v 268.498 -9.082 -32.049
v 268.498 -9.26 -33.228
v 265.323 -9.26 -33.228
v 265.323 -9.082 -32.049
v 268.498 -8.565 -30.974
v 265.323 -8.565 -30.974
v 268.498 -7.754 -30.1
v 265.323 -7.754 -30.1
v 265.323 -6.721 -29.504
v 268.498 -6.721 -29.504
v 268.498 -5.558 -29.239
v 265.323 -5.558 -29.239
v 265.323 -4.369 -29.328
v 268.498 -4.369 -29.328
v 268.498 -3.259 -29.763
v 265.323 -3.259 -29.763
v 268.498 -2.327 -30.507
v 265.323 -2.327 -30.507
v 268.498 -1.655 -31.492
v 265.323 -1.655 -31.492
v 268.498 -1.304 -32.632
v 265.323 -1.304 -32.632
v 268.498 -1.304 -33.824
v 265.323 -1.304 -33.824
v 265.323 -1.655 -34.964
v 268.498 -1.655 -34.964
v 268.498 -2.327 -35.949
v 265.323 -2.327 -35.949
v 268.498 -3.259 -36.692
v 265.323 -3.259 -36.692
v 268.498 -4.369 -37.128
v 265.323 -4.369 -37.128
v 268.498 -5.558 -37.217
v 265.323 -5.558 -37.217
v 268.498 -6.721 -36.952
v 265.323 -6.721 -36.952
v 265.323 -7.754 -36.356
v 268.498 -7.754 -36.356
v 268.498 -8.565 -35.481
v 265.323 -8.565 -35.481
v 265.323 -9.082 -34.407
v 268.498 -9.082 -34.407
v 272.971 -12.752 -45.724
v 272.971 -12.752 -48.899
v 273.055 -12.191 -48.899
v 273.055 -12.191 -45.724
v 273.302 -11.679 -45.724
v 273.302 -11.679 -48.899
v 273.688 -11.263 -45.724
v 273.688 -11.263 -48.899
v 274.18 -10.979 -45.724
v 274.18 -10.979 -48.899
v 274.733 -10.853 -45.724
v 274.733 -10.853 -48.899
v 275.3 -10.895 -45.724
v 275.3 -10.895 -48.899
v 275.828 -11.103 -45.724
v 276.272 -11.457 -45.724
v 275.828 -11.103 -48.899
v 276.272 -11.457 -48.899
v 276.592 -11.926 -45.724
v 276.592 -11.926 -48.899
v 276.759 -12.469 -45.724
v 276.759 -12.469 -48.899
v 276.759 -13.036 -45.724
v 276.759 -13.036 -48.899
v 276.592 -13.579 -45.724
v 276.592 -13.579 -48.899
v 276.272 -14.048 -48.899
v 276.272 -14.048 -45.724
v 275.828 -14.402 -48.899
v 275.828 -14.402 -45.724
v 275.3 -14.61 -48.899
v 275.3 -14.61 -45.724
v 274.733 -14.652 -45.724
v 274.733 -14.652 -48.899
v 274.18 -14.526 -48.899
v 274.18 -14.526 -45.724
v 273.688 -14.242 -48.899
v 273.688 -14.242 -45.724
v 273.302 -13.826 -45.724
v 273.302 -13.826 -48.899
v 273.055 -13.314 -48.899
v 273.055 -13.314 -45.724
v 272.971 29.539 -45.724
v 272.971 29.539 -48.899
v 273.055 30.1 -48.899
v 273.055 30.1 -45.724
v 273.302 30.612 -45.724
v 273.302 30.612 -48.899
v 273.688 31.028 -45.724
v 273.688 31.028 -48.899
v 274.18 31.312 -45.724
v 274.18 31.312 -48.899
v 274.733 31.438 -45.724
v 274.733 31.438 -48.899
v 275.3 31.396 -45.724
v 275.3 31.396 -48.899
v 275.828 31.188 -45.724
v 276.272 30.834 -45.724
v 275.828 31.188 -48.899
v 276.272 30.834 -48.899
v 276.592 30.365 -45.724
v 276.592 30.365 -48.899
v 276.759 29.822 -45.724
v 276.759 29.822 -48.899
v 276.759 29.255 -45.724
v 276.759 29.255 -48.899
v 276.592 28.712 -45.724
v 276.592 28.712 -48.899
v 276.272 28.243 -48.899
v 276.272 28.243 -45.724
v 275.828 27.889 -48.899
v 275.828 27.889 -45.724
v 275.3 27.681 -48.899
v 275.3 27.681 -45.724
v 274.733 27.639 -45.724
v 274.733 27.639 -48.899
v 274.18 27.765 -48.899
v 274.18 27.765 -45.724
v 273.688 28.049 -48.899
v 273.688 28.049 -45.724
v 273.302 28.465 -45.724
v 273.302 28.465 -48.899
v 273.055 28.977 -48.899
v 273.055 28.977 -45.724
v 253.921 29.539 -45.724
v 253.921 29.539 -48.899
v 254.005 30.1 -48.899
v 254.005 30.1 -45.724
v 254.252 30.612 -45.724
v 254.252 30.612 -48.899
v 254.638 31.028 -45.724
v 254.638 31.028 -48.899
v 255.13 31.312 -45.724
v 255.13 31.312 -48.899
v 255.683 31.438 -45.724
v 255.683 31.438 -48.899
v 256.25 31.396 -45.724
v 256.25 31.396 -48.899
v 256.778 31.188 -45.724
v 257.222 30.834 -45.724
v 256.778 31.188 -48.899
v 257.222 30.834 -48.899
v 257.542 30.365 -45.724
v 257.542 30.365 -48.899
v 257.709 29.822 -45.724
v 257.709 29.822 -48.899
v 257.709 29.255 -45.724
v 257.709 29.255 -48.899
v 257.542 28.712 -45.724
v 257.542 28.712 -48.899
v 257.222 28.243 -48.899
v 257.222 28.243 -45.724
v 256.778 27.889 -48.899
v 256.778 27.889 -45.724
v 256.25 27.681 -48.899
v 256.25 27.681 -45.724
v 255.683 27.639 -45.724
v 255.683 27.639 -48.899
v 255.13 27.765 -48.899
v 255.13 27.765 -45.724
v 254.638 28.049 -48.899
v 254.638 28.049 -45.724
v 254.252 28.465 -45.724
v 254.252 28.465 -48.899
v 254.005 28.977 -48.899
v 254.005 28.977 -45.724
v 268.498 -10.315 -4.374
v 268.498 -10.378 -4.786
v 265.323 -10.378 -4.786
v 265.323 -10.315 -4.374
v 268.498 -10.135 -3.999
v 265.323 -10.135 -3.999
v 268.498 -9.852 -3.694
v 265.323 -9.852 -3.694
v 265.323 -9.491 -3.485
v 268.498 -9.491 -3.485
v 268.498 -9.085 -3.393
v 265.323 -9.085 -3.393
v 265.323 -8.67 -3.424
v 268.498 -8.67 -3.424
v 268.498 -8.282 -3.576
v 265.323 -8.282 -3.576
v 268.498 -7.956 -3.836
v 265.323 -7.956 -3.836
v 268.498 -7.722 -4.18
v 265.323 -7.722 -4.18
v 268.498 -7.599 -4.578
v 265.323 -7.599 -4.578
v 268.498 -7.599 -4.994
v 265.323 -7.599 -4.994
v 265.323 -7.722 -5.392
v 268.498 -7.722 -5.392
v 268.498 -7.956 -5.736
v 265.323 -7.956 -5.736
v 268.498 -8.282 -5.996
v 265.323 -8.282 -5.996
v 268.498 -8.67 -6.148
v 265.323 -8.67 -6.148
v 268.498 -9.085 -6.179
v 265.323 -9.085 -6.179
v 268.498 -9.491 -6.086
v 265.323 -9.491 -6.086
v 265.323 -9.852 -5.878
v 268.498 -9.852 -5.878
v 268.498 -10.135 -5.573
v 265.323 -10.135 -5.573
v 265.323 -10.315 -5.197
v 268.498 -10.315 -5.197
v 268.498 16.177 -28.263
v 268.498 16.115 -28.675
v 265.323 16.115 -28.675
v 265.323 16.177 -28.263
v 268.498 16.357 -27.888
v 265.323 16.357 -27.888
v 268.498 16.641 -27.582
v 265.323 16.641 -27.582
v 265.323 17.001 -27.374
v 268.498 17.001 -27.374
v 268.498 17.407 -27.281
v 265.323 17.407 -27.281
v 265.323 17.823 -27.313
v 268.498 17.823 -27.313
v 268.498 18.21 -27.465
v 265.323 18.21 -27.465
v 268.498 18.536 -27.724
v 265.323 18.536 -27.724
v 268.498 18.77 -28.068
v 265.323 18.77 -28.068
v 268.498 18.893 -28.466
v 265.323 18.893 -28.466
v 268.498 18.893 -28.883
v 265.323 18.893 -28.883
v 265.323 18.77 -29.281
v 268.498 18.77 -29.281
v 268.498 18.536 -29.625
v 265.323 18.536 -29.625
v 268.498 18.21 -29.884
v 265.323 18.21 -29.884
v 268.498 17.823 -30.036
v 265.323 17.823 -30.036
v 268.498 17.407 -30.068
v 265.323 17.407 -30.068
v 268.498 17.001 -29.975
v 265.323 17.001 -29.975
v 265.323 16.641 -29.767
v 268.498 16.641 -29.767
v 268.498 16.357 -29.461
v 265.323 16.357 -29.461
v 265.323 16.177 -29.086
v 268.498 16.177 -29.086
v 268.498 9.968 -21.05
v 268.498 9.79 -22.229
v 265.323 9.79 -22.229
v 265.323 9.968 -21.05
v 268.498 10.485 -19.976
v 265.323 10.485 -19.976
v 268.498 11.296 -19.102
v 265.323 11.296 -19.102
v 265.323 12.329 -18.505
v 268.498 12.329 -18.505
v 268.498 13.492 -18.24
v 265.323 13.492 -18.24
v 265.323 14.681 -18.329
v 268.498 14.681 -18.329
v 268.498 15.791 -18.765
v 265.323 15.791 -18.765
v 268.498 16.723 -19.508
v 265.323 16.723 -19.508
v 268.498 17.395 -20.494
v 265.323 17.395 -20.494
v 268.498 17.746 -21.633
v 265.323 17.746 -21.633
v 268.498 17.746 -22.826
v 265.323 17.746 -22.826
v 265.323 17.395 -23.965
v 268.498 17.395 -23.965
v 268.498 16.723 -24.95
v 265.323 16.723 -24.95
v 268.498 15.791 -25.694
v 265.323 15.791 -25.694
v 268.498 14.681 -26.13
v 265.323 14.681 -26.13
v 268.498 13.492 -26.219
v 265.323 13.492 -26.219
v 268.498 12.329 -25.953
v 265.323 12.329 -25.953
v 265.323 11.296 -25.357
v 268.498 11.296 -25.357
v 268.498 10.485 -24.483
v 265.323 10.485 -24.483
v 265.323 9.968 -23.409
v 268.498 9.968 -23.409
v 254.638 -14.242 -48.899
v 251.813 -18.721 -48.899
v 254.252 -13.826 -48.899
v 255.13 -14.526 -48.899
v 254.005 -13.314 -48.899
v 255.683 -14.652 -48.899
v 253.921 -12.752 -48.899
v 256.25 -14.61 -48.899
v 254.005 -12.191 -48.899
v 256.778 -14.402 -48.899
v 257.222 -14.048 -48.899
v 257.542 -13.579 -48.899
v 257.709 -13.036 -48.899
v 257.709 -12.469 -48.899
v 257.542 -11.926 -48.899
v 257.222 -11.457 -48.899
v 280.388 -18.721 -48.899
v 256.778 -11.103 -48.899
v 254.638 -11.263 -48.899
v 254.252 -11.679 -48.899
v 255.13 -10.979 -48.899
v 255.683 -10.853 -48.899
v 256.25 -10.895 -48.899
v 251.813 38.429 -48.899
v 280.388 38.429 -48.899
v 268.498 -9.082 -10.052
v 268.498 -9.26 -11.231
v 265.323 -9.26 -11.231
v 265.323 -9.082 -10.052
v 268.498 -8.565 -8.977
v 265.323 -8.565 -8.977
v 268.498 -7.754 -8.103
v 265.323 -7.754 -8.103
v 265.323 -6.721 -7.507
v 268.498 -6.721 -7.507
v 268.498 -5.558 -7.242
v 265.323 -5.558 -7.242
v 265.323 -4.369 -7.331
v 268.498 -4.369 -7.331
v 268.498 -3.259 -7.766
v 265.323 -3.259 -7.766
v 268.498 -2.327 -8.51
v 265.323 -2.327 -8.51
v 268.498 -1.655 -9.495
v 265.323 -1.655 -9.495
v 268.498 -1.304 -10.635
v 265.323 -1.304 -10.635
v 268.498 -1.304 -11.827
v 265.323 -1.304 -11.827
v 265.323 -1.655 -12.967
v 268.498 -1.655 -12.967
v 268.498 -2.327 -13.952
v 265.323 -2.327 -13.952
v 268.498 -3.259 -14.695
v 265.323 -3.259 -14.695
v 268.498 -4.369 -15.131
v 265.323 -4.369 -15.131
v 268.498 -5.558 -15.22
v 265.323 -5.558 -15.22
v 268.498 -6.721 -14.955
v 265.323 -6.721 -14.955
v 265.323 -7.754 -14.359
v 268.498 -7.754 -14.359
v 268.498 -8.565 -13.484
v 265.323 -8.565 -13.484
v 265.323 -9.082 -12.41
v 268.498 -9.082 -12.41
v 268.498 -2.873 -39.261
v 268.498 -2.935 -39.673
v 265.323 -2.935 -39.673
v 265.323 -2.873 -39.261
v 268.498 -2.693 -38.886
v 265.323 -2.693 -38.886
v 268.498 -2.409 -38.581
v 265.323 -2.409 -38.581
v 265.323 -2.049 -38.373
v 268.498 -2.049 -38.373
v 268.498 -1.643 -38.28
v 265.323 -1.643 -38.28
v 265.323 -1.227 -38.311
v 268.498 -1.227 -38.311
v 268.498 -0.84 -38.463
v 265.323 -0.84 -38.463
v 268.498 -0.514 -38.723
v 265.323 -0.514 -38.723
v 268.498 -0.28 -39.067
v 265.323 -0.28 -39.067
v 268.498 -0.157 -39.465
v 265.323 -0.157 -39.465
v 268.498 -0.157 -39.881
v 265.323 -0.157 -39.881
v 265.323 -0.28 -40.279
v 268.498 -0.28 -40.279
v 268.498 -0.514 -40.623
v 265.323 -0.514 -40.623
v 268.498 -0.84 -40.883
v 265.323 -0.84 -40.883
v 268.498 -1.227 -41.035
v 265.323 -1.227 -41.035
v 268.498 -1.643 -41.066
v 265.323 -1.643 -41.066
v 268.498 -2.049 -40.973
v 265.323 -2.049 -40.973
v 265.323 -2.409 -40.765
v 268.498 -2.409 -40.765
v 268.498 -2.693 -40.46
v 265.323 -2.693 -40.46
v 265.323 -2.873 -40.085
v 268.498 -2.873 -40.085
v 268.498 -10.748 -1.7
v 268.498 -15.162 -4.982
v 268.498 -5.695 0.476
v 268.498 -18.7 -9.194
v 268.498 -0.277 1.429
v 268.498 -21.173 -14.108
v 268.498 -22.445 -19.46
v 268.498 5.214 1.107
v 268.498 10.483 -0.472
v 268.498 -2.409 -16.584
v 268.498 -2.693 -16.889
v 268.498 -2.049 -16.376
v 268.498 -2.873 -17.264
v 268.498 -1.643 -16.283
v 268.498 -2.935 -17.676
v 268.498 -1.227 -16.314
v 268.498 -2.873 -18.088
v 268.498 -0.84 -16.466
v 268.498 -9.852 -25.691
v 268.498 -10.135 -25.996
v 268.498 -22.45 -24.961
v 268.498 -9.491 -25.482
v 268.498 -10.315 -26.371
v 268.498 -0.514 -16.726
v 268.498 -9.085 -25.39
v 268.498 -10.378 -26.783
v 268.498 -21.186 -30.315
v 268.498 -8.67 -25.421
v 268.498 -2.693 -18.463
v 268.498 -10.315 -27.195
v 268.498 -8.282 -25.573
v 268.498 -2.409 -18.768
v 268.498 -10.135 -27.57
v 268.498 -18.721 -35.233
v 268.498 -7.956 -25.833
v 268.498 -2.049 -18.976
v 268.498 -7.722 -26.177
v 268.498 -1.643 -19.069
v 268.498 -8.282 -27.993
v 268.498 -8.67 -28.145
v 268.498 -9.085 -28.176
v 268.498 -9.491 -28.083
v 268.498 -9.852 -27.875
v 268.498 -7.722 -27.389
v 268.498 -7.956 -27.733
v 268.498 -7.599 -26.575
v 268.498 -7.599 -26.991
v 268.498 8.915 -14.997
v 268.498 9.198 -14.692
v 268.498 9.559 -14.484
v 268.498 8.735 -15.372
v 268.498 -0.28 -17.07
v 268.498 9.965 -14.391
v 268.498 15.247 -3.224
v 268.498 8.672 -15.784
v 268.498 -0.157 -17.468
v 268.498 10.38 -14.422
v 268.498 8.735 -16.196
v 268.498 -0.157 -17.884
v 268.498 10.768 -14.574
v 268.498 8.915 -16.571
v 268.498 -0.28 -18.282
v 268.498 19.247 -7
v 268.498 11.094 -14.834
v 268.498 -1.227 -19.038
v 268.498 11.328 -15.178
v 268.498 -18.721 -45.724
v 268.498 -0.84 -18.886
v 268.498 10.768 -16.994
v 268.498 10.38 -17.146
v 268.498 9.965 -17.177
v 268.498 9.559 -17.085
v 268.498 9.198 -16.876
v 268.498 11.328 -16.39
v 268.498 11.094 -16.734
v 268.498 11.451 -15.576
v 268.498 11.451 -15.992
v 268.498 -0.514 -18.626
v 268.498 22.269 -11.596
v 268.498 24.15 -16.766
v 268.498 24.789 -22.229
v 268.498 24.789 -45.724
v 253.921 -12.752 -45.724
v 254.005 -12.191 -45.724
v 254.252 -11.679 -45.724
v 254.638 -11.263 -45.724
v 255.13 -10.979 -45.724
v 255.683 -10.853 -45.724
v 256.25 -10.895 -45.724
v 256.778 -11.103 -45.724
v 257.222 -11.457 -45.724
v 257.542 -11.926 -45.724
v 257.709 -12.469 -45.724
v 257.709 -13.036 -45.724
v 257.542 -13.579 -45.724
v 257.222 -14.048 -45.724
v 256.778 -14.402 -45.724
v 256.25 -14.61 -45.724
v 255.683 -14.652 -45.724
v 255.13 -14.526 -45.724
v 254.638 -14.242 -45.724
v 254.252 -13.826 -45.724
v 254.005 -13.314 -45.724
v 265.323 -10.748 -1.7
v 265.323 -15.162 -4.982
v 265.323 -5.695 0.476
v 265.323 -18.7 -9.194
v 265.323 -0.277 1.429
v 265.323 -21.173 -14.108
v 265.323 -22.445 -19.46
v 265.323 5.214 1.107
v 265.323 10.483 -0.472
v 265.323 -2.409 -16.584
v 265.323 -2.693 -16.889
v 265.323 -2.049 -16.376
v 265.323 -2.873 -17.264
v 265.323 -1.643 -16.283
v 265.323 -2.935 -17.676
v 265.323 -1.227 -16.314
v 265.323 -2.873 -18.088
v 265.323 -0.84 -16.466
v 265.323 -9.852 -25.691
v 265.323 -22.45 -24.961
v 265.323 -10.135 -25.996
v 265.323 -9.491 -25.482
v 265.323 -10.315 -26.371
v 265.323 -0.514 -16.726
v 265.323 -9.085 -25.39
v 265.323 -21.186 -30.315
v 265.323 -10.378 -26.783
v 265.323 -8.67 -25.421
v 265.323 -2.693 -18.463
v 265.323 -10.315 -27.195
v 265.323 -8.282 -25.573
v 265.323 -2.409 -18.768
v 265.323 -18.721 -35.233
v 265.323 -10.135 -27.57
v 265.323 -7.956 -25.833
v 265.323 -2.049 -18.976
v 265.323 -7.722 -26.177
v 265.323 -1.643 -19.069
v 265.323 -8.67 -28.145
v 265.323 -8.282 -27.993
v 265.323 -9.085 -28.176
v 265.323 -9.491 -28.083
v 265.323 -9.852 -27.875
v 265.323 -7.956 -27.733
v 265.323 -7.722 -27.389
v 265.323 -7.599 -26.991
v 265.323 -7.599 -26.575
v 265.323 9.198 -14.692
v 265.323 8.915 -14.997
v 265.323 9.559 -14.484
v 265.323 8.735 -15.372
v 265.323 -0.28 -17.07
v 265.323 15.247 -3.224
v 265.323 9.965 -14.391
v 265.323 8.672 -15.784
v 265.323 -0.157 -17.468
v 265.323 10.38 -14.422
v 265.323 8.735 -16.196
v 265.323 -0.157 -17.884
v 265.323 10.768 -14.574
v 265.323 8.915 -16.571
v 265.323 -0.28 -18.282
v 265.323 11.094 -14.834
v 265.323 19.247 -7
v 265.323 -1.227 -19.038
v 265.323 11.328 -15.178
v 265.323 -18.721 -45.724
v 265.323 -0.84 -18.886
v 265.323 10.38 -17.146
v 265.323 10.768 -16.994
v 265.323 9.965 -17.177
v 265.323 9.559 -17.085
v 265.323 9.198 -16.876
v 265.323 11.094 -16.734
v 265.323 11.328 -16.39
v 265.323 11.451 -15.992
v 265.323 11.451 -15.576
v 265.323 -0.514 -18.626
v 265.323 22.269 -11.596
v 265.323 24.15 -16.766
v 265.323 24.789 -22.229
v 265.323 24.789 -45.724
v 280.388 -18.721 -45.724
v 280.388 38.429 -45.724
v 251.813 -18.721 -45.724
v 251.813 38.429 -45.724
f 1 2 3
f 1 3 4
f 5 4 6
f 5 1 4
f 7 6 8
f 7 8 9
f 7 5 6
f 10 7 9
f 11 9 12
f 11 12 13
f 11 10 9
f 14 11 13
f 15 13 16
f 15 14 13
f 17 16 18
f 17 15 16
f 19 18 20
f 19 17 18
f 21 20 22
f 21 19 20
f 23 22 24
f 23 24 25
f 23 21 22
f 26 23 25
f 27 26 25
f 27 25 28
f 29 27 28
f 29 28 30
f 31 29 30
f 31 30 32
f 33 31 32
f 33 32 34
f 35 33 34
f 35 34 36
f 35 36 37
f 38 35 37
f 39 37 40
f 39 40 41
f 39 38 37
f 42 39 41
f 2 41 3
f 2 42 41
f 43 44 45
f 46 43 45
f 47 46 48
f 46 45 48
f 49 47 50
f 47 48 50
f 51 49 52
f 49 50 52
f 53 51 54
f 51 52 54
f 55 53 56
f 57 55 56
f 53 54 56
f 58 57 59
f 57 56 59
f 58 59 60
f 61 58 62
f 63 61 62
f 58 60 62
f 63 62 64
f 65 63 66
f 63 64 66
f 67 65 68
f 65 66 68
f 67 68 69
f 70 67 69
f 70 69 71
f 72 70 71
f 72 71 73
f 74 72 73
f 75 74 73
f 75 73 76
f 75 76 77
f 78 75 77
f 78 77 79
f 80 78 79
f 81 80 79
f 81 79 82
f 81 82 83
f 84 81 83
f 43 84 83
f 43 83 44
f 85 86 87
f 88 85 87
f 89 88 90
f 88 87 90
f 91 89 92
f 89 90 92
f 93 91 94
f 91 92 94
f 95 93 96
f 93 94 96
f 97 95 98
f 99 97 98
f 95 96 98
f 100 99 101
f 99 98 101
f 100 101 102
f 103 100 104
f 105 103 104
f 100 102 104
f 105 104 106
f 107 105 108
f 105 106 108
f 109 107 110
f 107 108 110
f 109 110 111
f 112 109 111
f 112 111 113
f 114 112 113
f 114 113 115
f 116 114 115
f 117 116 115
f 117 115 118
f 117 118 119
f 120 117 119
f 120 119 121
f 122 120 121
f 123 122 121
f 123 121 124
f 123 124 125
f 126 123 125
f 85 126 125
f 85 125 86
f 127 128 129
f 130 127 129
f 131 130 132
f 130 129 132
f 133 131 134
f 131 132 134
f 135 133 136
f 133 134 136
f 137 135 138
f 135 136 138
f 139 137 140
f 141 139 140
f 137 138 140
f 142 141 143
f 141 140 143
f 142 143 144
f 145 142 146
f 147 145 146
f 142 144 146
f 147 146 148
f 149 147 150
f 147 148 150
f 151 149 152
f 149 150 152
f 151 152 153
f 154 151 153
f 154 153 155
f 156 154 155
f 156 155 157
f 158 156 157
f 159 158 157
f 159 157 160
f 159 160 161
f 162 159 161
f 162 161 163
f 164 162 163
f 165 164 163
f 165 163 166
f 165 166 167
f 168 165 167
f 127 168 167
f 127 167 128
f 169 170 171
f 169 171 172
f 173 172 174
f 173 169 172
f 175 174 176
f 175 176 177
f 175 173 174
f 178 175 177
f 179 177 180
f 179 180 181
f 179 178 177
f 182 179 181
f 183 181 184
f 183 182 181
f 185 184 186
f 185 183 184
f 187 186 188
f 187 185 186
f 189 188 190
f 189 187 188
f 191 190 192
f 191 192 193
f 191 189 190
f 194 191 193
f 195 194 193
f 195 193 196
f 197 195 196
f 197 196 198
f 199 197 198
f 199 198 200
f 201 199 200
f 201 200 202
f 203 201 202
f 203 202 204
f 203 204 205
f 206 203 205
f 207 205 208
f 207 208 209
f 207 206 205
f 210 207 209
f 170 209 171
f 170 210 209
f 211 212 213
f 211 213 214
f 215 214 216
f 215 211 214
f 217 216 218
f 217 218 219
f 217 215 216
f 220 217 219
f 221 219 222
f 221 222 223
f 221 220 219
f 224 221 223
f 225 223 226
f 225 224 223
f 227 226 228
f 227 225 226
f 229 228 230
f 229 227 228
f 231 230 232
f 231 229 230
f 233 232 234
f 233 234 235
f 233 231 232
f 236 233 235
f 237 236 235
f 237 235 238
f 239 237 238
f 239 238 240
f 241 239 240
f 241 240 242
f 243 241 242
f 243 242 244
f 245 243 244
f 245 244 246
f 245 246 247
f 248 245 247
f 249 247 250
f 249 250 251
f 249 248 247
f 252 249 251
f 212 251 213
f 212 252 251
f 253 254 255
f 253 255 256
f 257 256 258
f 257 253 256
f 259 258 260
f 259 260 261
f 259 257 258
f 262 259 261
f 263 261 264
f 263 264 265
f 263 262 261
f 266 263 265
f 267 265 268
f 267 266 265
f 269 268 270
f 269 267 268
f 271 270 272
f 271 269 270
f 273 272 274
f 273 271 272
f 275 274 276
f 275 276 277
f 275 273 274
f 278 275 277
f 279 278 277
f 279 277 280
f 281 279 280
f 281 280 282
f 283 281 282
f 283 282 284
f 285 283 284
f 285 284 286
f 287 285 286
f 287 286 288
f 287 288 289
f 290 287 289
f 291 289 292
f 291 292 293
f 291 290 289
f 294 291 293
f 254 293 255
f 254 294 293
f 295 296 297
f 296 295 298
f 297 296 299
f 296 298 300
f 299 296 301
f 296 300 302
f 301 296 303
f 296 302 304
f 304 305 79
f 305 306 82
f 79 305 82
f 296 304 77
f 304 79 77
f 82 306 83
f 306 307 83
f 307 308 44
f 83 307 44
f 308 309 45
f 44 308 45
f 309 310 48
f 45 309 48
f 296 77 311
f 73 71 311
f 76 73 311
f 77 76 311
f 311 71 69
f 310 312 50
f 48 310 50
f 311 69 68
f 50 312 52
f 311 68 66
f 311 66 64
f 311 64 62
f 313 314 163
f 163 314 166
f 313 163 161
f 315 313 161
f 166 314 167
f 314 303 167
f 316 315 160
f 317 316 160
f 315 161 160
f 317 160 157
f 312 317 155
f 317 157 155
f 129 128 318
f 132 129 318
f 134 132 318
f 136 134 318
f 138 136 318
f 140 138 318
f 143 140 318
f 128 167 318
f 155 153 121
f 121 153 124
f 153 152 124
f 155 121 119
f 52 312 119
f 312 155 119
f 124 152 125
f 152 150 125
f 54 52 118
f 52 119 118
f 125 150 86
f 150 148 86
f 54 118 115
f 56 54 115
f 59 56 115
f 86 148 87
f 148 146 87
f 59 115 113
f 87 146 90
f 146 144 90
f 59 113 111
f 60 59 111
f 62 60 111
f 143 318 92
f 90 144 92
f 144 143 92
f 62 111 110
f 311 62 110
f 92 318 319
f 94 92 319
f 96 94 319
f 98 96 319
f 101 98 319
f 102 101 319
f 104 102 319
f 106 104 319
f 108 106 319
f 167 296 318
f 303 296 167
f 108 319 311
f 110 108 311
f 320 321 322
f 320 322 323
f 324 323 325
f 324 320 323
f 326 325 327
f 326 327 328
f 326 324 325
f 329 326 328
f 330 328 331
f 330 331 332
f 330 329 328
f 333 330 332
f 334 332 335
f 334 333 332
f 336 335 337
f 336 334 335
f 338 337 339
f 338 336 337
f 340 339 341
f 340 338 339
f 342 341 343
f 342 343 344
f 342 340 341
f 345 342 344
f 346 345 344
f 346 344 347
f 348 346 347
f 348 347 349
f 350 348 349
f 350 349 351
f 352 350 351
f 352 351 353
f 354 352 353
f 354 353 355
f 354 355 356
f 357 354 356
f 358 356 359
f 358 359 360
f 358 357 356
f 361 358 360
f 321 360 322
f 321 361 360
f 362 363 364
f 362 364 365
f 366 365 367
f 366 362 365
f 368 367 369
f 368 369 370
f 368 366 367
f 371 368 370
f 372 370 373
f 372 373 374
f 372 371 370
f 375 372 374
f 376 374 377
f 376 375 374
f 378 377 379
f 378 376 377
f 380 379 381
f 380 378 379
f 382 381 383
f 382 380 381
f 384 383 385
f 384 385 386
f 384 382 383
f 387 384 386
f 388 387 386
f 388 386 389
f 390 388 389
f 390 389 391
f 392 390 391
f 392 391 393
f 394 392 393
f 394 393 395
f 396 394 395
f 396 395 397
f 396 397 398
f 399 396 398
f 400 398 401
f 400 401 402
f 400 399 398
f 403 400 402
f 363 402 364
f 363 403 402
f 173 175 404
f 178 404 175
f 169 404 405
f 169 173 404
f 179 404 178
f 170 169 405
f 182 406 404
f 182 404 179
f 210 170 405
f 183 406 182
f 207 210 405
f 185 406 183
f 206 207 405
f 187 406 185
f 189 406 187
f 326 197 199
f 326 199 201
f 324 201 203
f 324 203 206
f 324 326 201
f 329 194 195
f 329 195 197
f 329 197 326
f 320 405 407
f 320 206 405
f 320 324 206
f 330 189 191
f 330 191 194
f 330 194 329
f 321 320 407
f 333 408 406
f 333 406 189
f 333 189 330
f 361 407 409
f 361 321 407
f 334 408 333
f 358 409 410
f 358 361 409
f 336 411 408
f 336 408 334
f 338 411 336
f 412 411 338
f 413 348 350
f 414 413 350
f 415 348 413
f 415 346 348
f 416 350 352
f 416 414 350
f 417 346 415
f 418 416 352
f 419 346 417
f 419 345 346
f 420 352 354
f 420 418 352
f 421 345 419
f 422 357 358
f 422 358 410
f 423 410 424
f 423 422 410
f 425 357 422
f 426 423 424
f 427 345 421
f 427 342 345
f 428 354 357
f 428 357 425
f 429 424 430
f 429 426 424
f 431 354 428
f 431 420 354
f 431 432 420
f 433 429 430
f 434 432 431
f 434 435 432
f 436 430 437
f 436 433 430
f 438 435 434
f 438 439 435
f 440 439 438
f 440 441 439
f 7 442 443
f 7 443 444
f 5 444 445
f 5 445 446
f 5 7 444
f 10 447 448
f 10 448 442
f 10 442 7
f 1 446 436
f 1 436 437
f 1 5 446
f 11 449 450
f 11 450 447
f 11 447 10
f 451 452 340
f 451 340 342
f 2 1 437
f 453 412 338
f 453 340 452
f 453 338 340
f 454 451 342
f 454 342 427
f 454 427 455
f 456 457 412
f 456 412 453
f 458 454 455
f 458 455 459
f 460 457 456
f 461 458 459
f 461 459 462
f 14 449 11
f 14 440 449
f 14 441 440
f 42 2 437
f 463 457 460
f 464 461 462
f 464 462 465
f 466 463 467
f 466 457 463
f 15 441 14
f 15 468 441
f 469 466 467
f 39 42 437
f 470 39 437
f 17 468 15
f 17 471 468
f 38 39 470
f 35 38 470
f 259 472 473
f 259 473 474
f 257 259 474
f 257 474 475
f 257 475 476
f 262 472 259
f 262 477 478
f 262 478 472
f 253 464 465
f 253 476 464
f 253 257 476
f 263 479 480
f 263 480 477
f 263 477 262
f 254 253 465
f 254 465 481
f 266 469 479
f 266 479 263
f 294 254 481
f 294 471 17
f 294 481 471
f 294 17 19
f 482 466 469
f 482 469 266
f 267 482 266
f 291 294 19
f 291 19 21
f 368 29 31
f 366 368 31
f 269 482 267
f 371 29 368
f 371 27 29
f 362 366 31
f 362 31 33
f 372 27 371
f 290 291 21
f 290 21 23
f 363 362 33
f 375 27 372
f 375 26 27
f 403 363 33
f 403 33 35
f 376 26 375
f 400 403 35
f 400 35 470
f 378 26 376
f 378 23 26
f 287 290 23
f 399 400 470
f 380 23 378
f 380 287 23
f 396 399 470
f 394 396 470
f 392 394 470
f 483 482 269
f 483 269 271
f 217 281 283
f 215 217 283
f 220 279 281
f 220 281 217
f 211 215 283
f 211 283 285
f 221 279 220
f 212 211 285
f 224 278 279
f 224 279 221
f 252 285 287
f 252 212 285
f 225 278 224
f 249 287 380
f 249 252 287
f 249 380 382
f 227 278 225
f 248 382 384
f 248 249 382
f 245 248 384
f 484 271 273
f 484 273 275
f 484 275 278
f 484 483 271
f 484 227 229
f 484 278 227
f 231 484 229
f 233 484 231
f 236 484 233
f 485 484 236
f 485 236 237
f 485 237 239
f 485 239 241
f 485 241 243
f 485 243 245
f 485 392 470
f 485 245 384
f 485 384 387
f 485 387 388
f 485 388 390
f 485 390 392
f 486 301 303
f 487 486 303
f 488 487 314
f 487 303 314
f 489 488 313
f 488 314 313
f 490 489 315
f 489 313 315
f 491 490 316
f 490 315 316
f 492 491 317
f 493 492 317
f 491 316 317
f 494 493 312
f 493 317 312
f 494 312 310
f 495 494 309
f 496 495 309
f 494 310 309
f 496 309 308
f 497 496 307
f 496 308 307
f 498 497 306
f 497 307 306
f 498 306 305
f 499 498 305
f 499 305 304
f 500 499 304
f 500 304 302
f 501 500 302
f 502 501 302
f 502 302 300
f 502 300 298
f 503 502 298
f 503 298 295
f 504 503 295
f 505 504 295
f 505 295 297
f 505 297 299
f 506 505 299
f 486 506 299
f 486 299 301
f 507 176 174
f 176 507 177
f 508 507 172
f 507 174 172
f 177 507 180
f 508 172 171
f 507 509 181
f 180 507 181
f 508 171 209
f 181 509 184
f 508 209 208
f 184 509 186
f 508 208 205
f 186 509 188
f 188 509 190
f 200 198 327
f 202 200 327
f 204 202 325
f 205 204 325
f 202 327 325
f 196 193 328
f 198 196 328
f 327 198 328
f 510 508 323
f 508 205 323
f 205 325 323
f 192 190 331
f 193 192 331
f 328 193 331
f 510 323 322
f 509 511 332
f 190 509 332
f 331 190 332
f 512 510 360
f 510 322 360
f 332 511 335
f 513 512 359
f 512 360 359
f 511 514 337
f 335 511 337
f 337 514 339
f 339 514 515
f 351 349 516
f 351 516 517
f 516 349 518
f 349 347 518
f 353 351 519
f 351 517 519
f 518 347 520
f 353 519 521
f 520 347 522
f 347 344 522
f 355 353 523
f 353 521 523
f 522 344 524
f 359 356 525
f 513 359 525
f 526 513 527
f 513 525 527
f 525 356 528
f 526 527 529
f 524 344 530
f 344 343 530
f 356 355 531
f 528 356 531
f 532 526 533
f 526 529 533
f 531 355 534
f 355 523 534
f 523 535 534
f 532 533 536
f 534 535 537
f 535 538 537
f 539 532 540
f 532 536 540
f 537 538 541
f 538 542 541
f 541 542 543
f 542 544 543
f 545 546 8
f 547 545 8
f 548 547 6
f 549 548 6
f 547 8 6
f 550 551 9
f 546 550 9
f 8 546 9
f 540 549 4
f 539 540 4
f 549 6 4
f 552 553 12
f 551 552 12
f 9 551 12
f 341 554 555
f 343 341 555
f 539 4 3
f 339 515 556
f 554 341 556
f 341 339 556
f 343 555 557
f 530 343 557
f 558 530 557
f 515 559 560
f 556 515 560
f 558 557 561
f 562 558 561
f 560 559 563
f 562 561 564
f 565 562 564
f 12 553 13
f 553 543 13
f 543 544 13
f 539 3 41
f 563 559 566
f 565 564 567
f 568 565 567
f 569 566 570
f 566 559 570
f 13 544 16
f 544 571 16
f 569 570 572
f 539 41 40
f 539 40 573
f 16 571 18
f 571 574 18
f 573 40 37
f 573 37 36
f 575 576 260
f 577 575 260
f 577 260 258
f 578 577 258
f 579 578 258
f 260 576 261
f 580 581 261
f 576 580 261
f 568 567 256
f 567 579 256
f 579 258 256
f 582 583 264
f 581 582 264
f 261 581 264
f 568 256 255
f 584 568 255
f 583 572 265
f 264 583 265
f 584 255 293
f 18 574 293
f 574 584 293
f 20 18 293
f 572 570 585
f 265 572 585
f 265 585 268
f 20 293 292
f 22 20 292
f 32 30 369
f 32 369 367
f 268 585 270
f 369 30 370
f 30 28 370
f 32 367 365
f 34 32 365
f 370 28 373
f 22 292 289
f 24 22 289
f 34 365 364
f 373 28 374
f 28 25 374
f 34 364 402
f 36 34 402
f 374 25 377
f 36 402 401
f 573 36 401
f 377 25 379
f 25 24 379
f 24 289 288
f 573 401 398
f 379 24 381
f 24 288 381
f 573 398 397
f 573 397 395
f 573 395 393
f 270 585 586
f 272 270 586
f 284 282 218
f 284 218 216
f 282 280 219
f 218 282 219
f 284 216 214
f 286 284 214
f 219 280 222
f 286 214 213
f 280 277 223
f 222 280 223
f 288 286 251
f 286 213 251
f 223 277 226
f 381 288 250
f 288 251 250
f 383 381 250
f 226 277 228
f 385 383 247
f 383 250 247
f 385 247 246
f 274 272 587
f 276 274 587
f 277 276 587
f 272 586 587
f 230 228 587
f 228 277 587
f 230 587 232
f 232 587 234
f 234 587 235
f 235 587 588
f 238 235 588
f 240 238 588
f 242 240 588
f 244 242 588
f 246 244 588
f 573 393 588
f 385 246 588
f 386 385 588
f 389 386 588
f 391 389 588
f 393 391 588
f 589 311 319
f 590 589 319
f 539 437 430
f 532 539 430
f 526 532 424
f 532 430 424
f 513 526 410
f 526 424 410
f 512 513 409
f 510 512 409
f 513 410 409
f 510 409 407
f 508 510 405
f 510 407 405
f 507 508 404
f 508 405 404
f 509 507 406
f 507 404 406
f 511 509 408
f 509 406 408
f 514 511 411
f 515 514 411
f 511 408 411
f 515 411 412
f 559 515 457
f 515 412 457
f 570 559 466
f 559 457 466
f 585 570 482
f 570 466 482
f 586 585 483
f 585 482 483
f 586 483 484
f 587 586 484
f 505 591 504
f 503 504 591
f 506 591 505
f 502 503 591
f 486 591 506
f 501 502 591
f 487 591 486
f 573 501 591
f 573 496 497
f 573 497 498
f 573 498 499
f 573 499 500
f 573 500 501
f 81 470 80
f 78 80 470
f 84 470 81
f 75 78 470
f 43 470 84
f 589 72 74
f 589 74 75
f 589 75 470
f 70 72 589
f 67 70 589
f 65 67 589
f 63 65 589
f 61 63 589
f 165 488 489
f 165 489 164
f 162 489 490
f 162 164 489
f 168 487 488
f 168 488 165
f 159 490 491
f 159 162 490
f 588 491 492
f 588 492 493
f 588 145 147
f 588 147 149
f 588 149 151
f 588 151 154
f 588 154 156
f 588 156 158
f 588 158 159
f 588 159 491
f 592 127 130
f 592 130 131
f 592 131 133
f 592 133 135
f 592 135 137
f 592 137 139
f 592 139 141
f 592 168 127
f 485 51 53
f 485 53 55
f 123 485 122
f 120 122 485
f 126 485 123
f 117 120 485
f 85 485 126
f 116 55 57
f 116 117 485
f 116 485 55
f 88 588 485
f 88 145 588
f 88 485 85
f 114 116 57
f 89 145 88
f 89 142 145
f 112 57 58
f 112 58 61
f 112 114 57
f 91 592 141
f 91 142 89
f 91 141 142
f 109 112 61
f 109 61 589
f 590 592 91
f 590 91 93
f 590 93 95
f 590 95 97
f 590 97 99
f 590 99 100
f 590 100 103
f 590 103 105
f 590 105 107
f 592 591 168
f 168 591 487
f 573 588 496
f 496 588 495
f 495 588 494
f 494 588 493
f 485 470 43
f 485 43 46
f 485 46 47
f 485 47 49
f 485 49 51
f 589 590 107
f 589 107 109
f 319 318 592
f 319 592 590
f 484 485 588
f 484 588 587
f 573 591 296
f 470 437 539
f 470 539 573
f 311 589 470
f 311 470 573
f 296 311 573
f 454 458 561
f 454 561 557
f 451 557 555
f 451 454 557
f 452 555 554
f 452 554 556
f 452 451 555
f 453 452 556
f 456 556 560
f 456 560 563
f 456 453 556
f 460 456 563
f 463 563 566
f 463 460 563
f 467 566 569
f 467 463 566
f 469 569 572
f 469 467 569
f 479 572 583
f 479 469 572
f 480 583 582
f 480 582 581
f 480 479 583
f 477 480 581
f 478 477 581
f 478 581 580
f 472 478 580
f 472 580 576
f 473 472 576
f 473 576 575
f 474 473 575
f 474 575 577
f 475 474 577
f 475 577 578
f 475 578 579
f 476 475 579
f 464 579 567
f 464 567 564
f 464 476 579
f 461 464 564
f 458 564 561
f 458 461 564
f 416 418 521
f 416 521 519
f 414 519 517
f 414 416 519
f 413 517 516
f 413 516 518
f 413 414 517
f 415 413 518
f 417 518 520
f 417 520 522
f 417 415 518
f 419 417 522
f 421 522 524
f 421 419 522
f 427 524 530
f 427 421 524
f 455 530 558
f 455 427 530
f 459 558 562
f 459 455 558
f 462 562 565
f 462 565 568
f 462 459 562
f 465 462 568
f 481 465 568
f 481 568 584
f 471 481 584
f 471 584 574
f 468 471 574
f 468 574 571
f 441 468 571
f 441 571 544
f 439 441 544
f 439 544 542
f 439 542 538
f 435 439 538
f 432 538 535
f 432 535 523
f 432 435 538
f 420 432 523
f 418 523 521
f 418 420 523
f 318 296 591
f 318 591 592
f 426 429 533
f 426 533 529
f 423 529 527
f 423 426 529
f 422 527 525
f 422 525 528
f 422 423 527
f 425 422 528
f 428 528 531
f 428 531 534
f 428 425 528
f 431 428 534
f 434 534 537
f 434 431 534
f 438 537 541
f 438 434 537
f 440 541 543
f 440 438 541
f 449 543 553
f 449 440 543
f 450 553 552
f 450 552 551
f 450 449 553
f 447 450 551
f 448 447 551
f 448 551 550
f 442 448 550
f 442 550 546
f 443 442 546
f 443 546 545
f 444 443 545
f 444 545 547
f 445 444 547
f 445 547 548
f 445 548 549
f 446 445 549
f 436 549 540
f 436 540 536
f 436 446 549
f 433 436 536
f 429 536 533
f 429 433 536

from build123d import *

# Parameters (mm, degrees)
SKETCH1_R           = 23.6982
SKETCH1_R_2         = 1.397
SKETCH1_R_3         = 4.0005
BOSS_EXTRUDE1_DEPTH = 3.175
SKETCH2_W           = 28.575
SKETCH2_H           = 57.15
BOSS_EXTRUDE2_DEPTH = 3.175
BOSS_EXTRUDE3_DEPTH = 3.175
SKETCH5_R           = 1.905
CUT_EXTRUDE2_DEPTH  = 6.35


with BuildPart() as part:
    # Sketch1 → Boss-Extrude1 (new body)
    with BuildSketch(Plane.ZY.offset(-268.497812887)):
        with Locations(Location((-22.229377206, 1.090549523, 0), (0, 0, 270))):
            Circle(SKETCH1_R)
        with Locations(Location((-4.785720318, -8.980550477, 0), (0, 0, 270))):
            Circle(SKETCH1_R_2, mode=Mode.SUBTRACT)
        with Locations(Location((-17.675988838, -1.538350477, 0), (0, 0, 270))):
            Circle(SKETCH1_R_2, mode=Mode.SUBTRACT)
        with Locations(Location((-26.782765574, -8.980550477, 0), (0, 0, 270))):
            Circle(SKETCH1_R_2, mode=Mode.SUBTRACT)
        with Locations(Location((-39.673034094, -1.538350477, 0), (0, 0, 270))):
            Circle(SKETCH1_R_2, mode=Mode.SUBTRACT)
        with Locations(Location((-28.674511466, 17.511649523, 0), (0, 0, 270))):
            Circle(SKETCH1_R_2, mode=Mode.SUBTRACT)
        with Locations(Location((-15.784242946, 10.069449523, 0), (0, 0, 270))):
            Circle(SKETCH1_R_2, mode=Mode.SUBTRACT)
        with Locations(Location((-11.230854578, -5.259450477, 0), (0, 0, 270))):
            Circle(SKETCH1_R_3, mode=Mode.SUBTRACT)
        with Locations(Location((-33.227899834, -5.259450477, 0), (0, 0, 270))):
            Circle(SKETCH1_R_3, mode=Mode.SUBTRACT)
        with Locations(Location((-22.229377206, 13.790549523, 0), (0, 0, 270))):
            Circle(SKETCH1_R_3, mode=Mode.SUBTRACT)
    extrude(amount=BOSS_EXTRUDE1_DEPTH)

    # Sketch2 → Boss-Extrude2 (add)
    with BuildSketch(Plane.XY.offset(-48.899377206)):
        with Locations((266.100312887, 9.853549523)):
            Rectangle(SKETCH2_W, SKETCH2_H)
    extrude(amount=BOSS_EXTRUDE2_DEPTH)

    # Sketch4 → Boss-Extrude3 (add)
    with BuildSketch(Plane(origin=(268.497812887, 0, 0), x_dir=(0, 0, -1), z_dir=(1, 0, 0))):
        with BuildLine():
            Line((45.724377206, -18.721450477), (45.724377206, -2.00616781))
            ThreePointArc((45.724377206, -2.00616781), (42.301350708, -11.507885419), (35.232812877, -18.721450477))
            Line((35.232812877, -18.721450477), (45.724377206, -18.721450477))
        make_face()
        with BuildLine():
            Line((45.724377206, 24.788749523), (22.229377206, 24.788749523))
            ThreePointArc((22.229377206, 24.788749523), (37.853366078, 18.908957279), (45.724377206, 4.187266856))
            Line((45.724377206, 4.187266856), (45.724377206, 24.788749523))
        make_face()
    extrude(amount=-BOSS_EXTRUDE3_DEPTH)

    # Sketch5 → Cut-Extrude2 (cut)
    with BuildSketch(Plane(origin=(0, 0, -48.899377206), x_dir=(-1, 0, 0), z_dir=(0, 0, -1))):
        with Locations((-274.875666904, -12.752450477)):
            Circle(SKETCH5_R)
        with Locations((-274.875666904, 29.538549523)):
            Circle(SKETCH5_R)
        with Locations((-255.825666904, 29.538549523)):
            Circle(SKETCH5_R)
        with Locations((-255.825666904, -12.752450477)):
            Circle(SKETCH5_R)
    extrude(amount=-CUT_EXTRUDE2_DEPTH, mode=Mode.SUBTRACT)


solid = part.part
